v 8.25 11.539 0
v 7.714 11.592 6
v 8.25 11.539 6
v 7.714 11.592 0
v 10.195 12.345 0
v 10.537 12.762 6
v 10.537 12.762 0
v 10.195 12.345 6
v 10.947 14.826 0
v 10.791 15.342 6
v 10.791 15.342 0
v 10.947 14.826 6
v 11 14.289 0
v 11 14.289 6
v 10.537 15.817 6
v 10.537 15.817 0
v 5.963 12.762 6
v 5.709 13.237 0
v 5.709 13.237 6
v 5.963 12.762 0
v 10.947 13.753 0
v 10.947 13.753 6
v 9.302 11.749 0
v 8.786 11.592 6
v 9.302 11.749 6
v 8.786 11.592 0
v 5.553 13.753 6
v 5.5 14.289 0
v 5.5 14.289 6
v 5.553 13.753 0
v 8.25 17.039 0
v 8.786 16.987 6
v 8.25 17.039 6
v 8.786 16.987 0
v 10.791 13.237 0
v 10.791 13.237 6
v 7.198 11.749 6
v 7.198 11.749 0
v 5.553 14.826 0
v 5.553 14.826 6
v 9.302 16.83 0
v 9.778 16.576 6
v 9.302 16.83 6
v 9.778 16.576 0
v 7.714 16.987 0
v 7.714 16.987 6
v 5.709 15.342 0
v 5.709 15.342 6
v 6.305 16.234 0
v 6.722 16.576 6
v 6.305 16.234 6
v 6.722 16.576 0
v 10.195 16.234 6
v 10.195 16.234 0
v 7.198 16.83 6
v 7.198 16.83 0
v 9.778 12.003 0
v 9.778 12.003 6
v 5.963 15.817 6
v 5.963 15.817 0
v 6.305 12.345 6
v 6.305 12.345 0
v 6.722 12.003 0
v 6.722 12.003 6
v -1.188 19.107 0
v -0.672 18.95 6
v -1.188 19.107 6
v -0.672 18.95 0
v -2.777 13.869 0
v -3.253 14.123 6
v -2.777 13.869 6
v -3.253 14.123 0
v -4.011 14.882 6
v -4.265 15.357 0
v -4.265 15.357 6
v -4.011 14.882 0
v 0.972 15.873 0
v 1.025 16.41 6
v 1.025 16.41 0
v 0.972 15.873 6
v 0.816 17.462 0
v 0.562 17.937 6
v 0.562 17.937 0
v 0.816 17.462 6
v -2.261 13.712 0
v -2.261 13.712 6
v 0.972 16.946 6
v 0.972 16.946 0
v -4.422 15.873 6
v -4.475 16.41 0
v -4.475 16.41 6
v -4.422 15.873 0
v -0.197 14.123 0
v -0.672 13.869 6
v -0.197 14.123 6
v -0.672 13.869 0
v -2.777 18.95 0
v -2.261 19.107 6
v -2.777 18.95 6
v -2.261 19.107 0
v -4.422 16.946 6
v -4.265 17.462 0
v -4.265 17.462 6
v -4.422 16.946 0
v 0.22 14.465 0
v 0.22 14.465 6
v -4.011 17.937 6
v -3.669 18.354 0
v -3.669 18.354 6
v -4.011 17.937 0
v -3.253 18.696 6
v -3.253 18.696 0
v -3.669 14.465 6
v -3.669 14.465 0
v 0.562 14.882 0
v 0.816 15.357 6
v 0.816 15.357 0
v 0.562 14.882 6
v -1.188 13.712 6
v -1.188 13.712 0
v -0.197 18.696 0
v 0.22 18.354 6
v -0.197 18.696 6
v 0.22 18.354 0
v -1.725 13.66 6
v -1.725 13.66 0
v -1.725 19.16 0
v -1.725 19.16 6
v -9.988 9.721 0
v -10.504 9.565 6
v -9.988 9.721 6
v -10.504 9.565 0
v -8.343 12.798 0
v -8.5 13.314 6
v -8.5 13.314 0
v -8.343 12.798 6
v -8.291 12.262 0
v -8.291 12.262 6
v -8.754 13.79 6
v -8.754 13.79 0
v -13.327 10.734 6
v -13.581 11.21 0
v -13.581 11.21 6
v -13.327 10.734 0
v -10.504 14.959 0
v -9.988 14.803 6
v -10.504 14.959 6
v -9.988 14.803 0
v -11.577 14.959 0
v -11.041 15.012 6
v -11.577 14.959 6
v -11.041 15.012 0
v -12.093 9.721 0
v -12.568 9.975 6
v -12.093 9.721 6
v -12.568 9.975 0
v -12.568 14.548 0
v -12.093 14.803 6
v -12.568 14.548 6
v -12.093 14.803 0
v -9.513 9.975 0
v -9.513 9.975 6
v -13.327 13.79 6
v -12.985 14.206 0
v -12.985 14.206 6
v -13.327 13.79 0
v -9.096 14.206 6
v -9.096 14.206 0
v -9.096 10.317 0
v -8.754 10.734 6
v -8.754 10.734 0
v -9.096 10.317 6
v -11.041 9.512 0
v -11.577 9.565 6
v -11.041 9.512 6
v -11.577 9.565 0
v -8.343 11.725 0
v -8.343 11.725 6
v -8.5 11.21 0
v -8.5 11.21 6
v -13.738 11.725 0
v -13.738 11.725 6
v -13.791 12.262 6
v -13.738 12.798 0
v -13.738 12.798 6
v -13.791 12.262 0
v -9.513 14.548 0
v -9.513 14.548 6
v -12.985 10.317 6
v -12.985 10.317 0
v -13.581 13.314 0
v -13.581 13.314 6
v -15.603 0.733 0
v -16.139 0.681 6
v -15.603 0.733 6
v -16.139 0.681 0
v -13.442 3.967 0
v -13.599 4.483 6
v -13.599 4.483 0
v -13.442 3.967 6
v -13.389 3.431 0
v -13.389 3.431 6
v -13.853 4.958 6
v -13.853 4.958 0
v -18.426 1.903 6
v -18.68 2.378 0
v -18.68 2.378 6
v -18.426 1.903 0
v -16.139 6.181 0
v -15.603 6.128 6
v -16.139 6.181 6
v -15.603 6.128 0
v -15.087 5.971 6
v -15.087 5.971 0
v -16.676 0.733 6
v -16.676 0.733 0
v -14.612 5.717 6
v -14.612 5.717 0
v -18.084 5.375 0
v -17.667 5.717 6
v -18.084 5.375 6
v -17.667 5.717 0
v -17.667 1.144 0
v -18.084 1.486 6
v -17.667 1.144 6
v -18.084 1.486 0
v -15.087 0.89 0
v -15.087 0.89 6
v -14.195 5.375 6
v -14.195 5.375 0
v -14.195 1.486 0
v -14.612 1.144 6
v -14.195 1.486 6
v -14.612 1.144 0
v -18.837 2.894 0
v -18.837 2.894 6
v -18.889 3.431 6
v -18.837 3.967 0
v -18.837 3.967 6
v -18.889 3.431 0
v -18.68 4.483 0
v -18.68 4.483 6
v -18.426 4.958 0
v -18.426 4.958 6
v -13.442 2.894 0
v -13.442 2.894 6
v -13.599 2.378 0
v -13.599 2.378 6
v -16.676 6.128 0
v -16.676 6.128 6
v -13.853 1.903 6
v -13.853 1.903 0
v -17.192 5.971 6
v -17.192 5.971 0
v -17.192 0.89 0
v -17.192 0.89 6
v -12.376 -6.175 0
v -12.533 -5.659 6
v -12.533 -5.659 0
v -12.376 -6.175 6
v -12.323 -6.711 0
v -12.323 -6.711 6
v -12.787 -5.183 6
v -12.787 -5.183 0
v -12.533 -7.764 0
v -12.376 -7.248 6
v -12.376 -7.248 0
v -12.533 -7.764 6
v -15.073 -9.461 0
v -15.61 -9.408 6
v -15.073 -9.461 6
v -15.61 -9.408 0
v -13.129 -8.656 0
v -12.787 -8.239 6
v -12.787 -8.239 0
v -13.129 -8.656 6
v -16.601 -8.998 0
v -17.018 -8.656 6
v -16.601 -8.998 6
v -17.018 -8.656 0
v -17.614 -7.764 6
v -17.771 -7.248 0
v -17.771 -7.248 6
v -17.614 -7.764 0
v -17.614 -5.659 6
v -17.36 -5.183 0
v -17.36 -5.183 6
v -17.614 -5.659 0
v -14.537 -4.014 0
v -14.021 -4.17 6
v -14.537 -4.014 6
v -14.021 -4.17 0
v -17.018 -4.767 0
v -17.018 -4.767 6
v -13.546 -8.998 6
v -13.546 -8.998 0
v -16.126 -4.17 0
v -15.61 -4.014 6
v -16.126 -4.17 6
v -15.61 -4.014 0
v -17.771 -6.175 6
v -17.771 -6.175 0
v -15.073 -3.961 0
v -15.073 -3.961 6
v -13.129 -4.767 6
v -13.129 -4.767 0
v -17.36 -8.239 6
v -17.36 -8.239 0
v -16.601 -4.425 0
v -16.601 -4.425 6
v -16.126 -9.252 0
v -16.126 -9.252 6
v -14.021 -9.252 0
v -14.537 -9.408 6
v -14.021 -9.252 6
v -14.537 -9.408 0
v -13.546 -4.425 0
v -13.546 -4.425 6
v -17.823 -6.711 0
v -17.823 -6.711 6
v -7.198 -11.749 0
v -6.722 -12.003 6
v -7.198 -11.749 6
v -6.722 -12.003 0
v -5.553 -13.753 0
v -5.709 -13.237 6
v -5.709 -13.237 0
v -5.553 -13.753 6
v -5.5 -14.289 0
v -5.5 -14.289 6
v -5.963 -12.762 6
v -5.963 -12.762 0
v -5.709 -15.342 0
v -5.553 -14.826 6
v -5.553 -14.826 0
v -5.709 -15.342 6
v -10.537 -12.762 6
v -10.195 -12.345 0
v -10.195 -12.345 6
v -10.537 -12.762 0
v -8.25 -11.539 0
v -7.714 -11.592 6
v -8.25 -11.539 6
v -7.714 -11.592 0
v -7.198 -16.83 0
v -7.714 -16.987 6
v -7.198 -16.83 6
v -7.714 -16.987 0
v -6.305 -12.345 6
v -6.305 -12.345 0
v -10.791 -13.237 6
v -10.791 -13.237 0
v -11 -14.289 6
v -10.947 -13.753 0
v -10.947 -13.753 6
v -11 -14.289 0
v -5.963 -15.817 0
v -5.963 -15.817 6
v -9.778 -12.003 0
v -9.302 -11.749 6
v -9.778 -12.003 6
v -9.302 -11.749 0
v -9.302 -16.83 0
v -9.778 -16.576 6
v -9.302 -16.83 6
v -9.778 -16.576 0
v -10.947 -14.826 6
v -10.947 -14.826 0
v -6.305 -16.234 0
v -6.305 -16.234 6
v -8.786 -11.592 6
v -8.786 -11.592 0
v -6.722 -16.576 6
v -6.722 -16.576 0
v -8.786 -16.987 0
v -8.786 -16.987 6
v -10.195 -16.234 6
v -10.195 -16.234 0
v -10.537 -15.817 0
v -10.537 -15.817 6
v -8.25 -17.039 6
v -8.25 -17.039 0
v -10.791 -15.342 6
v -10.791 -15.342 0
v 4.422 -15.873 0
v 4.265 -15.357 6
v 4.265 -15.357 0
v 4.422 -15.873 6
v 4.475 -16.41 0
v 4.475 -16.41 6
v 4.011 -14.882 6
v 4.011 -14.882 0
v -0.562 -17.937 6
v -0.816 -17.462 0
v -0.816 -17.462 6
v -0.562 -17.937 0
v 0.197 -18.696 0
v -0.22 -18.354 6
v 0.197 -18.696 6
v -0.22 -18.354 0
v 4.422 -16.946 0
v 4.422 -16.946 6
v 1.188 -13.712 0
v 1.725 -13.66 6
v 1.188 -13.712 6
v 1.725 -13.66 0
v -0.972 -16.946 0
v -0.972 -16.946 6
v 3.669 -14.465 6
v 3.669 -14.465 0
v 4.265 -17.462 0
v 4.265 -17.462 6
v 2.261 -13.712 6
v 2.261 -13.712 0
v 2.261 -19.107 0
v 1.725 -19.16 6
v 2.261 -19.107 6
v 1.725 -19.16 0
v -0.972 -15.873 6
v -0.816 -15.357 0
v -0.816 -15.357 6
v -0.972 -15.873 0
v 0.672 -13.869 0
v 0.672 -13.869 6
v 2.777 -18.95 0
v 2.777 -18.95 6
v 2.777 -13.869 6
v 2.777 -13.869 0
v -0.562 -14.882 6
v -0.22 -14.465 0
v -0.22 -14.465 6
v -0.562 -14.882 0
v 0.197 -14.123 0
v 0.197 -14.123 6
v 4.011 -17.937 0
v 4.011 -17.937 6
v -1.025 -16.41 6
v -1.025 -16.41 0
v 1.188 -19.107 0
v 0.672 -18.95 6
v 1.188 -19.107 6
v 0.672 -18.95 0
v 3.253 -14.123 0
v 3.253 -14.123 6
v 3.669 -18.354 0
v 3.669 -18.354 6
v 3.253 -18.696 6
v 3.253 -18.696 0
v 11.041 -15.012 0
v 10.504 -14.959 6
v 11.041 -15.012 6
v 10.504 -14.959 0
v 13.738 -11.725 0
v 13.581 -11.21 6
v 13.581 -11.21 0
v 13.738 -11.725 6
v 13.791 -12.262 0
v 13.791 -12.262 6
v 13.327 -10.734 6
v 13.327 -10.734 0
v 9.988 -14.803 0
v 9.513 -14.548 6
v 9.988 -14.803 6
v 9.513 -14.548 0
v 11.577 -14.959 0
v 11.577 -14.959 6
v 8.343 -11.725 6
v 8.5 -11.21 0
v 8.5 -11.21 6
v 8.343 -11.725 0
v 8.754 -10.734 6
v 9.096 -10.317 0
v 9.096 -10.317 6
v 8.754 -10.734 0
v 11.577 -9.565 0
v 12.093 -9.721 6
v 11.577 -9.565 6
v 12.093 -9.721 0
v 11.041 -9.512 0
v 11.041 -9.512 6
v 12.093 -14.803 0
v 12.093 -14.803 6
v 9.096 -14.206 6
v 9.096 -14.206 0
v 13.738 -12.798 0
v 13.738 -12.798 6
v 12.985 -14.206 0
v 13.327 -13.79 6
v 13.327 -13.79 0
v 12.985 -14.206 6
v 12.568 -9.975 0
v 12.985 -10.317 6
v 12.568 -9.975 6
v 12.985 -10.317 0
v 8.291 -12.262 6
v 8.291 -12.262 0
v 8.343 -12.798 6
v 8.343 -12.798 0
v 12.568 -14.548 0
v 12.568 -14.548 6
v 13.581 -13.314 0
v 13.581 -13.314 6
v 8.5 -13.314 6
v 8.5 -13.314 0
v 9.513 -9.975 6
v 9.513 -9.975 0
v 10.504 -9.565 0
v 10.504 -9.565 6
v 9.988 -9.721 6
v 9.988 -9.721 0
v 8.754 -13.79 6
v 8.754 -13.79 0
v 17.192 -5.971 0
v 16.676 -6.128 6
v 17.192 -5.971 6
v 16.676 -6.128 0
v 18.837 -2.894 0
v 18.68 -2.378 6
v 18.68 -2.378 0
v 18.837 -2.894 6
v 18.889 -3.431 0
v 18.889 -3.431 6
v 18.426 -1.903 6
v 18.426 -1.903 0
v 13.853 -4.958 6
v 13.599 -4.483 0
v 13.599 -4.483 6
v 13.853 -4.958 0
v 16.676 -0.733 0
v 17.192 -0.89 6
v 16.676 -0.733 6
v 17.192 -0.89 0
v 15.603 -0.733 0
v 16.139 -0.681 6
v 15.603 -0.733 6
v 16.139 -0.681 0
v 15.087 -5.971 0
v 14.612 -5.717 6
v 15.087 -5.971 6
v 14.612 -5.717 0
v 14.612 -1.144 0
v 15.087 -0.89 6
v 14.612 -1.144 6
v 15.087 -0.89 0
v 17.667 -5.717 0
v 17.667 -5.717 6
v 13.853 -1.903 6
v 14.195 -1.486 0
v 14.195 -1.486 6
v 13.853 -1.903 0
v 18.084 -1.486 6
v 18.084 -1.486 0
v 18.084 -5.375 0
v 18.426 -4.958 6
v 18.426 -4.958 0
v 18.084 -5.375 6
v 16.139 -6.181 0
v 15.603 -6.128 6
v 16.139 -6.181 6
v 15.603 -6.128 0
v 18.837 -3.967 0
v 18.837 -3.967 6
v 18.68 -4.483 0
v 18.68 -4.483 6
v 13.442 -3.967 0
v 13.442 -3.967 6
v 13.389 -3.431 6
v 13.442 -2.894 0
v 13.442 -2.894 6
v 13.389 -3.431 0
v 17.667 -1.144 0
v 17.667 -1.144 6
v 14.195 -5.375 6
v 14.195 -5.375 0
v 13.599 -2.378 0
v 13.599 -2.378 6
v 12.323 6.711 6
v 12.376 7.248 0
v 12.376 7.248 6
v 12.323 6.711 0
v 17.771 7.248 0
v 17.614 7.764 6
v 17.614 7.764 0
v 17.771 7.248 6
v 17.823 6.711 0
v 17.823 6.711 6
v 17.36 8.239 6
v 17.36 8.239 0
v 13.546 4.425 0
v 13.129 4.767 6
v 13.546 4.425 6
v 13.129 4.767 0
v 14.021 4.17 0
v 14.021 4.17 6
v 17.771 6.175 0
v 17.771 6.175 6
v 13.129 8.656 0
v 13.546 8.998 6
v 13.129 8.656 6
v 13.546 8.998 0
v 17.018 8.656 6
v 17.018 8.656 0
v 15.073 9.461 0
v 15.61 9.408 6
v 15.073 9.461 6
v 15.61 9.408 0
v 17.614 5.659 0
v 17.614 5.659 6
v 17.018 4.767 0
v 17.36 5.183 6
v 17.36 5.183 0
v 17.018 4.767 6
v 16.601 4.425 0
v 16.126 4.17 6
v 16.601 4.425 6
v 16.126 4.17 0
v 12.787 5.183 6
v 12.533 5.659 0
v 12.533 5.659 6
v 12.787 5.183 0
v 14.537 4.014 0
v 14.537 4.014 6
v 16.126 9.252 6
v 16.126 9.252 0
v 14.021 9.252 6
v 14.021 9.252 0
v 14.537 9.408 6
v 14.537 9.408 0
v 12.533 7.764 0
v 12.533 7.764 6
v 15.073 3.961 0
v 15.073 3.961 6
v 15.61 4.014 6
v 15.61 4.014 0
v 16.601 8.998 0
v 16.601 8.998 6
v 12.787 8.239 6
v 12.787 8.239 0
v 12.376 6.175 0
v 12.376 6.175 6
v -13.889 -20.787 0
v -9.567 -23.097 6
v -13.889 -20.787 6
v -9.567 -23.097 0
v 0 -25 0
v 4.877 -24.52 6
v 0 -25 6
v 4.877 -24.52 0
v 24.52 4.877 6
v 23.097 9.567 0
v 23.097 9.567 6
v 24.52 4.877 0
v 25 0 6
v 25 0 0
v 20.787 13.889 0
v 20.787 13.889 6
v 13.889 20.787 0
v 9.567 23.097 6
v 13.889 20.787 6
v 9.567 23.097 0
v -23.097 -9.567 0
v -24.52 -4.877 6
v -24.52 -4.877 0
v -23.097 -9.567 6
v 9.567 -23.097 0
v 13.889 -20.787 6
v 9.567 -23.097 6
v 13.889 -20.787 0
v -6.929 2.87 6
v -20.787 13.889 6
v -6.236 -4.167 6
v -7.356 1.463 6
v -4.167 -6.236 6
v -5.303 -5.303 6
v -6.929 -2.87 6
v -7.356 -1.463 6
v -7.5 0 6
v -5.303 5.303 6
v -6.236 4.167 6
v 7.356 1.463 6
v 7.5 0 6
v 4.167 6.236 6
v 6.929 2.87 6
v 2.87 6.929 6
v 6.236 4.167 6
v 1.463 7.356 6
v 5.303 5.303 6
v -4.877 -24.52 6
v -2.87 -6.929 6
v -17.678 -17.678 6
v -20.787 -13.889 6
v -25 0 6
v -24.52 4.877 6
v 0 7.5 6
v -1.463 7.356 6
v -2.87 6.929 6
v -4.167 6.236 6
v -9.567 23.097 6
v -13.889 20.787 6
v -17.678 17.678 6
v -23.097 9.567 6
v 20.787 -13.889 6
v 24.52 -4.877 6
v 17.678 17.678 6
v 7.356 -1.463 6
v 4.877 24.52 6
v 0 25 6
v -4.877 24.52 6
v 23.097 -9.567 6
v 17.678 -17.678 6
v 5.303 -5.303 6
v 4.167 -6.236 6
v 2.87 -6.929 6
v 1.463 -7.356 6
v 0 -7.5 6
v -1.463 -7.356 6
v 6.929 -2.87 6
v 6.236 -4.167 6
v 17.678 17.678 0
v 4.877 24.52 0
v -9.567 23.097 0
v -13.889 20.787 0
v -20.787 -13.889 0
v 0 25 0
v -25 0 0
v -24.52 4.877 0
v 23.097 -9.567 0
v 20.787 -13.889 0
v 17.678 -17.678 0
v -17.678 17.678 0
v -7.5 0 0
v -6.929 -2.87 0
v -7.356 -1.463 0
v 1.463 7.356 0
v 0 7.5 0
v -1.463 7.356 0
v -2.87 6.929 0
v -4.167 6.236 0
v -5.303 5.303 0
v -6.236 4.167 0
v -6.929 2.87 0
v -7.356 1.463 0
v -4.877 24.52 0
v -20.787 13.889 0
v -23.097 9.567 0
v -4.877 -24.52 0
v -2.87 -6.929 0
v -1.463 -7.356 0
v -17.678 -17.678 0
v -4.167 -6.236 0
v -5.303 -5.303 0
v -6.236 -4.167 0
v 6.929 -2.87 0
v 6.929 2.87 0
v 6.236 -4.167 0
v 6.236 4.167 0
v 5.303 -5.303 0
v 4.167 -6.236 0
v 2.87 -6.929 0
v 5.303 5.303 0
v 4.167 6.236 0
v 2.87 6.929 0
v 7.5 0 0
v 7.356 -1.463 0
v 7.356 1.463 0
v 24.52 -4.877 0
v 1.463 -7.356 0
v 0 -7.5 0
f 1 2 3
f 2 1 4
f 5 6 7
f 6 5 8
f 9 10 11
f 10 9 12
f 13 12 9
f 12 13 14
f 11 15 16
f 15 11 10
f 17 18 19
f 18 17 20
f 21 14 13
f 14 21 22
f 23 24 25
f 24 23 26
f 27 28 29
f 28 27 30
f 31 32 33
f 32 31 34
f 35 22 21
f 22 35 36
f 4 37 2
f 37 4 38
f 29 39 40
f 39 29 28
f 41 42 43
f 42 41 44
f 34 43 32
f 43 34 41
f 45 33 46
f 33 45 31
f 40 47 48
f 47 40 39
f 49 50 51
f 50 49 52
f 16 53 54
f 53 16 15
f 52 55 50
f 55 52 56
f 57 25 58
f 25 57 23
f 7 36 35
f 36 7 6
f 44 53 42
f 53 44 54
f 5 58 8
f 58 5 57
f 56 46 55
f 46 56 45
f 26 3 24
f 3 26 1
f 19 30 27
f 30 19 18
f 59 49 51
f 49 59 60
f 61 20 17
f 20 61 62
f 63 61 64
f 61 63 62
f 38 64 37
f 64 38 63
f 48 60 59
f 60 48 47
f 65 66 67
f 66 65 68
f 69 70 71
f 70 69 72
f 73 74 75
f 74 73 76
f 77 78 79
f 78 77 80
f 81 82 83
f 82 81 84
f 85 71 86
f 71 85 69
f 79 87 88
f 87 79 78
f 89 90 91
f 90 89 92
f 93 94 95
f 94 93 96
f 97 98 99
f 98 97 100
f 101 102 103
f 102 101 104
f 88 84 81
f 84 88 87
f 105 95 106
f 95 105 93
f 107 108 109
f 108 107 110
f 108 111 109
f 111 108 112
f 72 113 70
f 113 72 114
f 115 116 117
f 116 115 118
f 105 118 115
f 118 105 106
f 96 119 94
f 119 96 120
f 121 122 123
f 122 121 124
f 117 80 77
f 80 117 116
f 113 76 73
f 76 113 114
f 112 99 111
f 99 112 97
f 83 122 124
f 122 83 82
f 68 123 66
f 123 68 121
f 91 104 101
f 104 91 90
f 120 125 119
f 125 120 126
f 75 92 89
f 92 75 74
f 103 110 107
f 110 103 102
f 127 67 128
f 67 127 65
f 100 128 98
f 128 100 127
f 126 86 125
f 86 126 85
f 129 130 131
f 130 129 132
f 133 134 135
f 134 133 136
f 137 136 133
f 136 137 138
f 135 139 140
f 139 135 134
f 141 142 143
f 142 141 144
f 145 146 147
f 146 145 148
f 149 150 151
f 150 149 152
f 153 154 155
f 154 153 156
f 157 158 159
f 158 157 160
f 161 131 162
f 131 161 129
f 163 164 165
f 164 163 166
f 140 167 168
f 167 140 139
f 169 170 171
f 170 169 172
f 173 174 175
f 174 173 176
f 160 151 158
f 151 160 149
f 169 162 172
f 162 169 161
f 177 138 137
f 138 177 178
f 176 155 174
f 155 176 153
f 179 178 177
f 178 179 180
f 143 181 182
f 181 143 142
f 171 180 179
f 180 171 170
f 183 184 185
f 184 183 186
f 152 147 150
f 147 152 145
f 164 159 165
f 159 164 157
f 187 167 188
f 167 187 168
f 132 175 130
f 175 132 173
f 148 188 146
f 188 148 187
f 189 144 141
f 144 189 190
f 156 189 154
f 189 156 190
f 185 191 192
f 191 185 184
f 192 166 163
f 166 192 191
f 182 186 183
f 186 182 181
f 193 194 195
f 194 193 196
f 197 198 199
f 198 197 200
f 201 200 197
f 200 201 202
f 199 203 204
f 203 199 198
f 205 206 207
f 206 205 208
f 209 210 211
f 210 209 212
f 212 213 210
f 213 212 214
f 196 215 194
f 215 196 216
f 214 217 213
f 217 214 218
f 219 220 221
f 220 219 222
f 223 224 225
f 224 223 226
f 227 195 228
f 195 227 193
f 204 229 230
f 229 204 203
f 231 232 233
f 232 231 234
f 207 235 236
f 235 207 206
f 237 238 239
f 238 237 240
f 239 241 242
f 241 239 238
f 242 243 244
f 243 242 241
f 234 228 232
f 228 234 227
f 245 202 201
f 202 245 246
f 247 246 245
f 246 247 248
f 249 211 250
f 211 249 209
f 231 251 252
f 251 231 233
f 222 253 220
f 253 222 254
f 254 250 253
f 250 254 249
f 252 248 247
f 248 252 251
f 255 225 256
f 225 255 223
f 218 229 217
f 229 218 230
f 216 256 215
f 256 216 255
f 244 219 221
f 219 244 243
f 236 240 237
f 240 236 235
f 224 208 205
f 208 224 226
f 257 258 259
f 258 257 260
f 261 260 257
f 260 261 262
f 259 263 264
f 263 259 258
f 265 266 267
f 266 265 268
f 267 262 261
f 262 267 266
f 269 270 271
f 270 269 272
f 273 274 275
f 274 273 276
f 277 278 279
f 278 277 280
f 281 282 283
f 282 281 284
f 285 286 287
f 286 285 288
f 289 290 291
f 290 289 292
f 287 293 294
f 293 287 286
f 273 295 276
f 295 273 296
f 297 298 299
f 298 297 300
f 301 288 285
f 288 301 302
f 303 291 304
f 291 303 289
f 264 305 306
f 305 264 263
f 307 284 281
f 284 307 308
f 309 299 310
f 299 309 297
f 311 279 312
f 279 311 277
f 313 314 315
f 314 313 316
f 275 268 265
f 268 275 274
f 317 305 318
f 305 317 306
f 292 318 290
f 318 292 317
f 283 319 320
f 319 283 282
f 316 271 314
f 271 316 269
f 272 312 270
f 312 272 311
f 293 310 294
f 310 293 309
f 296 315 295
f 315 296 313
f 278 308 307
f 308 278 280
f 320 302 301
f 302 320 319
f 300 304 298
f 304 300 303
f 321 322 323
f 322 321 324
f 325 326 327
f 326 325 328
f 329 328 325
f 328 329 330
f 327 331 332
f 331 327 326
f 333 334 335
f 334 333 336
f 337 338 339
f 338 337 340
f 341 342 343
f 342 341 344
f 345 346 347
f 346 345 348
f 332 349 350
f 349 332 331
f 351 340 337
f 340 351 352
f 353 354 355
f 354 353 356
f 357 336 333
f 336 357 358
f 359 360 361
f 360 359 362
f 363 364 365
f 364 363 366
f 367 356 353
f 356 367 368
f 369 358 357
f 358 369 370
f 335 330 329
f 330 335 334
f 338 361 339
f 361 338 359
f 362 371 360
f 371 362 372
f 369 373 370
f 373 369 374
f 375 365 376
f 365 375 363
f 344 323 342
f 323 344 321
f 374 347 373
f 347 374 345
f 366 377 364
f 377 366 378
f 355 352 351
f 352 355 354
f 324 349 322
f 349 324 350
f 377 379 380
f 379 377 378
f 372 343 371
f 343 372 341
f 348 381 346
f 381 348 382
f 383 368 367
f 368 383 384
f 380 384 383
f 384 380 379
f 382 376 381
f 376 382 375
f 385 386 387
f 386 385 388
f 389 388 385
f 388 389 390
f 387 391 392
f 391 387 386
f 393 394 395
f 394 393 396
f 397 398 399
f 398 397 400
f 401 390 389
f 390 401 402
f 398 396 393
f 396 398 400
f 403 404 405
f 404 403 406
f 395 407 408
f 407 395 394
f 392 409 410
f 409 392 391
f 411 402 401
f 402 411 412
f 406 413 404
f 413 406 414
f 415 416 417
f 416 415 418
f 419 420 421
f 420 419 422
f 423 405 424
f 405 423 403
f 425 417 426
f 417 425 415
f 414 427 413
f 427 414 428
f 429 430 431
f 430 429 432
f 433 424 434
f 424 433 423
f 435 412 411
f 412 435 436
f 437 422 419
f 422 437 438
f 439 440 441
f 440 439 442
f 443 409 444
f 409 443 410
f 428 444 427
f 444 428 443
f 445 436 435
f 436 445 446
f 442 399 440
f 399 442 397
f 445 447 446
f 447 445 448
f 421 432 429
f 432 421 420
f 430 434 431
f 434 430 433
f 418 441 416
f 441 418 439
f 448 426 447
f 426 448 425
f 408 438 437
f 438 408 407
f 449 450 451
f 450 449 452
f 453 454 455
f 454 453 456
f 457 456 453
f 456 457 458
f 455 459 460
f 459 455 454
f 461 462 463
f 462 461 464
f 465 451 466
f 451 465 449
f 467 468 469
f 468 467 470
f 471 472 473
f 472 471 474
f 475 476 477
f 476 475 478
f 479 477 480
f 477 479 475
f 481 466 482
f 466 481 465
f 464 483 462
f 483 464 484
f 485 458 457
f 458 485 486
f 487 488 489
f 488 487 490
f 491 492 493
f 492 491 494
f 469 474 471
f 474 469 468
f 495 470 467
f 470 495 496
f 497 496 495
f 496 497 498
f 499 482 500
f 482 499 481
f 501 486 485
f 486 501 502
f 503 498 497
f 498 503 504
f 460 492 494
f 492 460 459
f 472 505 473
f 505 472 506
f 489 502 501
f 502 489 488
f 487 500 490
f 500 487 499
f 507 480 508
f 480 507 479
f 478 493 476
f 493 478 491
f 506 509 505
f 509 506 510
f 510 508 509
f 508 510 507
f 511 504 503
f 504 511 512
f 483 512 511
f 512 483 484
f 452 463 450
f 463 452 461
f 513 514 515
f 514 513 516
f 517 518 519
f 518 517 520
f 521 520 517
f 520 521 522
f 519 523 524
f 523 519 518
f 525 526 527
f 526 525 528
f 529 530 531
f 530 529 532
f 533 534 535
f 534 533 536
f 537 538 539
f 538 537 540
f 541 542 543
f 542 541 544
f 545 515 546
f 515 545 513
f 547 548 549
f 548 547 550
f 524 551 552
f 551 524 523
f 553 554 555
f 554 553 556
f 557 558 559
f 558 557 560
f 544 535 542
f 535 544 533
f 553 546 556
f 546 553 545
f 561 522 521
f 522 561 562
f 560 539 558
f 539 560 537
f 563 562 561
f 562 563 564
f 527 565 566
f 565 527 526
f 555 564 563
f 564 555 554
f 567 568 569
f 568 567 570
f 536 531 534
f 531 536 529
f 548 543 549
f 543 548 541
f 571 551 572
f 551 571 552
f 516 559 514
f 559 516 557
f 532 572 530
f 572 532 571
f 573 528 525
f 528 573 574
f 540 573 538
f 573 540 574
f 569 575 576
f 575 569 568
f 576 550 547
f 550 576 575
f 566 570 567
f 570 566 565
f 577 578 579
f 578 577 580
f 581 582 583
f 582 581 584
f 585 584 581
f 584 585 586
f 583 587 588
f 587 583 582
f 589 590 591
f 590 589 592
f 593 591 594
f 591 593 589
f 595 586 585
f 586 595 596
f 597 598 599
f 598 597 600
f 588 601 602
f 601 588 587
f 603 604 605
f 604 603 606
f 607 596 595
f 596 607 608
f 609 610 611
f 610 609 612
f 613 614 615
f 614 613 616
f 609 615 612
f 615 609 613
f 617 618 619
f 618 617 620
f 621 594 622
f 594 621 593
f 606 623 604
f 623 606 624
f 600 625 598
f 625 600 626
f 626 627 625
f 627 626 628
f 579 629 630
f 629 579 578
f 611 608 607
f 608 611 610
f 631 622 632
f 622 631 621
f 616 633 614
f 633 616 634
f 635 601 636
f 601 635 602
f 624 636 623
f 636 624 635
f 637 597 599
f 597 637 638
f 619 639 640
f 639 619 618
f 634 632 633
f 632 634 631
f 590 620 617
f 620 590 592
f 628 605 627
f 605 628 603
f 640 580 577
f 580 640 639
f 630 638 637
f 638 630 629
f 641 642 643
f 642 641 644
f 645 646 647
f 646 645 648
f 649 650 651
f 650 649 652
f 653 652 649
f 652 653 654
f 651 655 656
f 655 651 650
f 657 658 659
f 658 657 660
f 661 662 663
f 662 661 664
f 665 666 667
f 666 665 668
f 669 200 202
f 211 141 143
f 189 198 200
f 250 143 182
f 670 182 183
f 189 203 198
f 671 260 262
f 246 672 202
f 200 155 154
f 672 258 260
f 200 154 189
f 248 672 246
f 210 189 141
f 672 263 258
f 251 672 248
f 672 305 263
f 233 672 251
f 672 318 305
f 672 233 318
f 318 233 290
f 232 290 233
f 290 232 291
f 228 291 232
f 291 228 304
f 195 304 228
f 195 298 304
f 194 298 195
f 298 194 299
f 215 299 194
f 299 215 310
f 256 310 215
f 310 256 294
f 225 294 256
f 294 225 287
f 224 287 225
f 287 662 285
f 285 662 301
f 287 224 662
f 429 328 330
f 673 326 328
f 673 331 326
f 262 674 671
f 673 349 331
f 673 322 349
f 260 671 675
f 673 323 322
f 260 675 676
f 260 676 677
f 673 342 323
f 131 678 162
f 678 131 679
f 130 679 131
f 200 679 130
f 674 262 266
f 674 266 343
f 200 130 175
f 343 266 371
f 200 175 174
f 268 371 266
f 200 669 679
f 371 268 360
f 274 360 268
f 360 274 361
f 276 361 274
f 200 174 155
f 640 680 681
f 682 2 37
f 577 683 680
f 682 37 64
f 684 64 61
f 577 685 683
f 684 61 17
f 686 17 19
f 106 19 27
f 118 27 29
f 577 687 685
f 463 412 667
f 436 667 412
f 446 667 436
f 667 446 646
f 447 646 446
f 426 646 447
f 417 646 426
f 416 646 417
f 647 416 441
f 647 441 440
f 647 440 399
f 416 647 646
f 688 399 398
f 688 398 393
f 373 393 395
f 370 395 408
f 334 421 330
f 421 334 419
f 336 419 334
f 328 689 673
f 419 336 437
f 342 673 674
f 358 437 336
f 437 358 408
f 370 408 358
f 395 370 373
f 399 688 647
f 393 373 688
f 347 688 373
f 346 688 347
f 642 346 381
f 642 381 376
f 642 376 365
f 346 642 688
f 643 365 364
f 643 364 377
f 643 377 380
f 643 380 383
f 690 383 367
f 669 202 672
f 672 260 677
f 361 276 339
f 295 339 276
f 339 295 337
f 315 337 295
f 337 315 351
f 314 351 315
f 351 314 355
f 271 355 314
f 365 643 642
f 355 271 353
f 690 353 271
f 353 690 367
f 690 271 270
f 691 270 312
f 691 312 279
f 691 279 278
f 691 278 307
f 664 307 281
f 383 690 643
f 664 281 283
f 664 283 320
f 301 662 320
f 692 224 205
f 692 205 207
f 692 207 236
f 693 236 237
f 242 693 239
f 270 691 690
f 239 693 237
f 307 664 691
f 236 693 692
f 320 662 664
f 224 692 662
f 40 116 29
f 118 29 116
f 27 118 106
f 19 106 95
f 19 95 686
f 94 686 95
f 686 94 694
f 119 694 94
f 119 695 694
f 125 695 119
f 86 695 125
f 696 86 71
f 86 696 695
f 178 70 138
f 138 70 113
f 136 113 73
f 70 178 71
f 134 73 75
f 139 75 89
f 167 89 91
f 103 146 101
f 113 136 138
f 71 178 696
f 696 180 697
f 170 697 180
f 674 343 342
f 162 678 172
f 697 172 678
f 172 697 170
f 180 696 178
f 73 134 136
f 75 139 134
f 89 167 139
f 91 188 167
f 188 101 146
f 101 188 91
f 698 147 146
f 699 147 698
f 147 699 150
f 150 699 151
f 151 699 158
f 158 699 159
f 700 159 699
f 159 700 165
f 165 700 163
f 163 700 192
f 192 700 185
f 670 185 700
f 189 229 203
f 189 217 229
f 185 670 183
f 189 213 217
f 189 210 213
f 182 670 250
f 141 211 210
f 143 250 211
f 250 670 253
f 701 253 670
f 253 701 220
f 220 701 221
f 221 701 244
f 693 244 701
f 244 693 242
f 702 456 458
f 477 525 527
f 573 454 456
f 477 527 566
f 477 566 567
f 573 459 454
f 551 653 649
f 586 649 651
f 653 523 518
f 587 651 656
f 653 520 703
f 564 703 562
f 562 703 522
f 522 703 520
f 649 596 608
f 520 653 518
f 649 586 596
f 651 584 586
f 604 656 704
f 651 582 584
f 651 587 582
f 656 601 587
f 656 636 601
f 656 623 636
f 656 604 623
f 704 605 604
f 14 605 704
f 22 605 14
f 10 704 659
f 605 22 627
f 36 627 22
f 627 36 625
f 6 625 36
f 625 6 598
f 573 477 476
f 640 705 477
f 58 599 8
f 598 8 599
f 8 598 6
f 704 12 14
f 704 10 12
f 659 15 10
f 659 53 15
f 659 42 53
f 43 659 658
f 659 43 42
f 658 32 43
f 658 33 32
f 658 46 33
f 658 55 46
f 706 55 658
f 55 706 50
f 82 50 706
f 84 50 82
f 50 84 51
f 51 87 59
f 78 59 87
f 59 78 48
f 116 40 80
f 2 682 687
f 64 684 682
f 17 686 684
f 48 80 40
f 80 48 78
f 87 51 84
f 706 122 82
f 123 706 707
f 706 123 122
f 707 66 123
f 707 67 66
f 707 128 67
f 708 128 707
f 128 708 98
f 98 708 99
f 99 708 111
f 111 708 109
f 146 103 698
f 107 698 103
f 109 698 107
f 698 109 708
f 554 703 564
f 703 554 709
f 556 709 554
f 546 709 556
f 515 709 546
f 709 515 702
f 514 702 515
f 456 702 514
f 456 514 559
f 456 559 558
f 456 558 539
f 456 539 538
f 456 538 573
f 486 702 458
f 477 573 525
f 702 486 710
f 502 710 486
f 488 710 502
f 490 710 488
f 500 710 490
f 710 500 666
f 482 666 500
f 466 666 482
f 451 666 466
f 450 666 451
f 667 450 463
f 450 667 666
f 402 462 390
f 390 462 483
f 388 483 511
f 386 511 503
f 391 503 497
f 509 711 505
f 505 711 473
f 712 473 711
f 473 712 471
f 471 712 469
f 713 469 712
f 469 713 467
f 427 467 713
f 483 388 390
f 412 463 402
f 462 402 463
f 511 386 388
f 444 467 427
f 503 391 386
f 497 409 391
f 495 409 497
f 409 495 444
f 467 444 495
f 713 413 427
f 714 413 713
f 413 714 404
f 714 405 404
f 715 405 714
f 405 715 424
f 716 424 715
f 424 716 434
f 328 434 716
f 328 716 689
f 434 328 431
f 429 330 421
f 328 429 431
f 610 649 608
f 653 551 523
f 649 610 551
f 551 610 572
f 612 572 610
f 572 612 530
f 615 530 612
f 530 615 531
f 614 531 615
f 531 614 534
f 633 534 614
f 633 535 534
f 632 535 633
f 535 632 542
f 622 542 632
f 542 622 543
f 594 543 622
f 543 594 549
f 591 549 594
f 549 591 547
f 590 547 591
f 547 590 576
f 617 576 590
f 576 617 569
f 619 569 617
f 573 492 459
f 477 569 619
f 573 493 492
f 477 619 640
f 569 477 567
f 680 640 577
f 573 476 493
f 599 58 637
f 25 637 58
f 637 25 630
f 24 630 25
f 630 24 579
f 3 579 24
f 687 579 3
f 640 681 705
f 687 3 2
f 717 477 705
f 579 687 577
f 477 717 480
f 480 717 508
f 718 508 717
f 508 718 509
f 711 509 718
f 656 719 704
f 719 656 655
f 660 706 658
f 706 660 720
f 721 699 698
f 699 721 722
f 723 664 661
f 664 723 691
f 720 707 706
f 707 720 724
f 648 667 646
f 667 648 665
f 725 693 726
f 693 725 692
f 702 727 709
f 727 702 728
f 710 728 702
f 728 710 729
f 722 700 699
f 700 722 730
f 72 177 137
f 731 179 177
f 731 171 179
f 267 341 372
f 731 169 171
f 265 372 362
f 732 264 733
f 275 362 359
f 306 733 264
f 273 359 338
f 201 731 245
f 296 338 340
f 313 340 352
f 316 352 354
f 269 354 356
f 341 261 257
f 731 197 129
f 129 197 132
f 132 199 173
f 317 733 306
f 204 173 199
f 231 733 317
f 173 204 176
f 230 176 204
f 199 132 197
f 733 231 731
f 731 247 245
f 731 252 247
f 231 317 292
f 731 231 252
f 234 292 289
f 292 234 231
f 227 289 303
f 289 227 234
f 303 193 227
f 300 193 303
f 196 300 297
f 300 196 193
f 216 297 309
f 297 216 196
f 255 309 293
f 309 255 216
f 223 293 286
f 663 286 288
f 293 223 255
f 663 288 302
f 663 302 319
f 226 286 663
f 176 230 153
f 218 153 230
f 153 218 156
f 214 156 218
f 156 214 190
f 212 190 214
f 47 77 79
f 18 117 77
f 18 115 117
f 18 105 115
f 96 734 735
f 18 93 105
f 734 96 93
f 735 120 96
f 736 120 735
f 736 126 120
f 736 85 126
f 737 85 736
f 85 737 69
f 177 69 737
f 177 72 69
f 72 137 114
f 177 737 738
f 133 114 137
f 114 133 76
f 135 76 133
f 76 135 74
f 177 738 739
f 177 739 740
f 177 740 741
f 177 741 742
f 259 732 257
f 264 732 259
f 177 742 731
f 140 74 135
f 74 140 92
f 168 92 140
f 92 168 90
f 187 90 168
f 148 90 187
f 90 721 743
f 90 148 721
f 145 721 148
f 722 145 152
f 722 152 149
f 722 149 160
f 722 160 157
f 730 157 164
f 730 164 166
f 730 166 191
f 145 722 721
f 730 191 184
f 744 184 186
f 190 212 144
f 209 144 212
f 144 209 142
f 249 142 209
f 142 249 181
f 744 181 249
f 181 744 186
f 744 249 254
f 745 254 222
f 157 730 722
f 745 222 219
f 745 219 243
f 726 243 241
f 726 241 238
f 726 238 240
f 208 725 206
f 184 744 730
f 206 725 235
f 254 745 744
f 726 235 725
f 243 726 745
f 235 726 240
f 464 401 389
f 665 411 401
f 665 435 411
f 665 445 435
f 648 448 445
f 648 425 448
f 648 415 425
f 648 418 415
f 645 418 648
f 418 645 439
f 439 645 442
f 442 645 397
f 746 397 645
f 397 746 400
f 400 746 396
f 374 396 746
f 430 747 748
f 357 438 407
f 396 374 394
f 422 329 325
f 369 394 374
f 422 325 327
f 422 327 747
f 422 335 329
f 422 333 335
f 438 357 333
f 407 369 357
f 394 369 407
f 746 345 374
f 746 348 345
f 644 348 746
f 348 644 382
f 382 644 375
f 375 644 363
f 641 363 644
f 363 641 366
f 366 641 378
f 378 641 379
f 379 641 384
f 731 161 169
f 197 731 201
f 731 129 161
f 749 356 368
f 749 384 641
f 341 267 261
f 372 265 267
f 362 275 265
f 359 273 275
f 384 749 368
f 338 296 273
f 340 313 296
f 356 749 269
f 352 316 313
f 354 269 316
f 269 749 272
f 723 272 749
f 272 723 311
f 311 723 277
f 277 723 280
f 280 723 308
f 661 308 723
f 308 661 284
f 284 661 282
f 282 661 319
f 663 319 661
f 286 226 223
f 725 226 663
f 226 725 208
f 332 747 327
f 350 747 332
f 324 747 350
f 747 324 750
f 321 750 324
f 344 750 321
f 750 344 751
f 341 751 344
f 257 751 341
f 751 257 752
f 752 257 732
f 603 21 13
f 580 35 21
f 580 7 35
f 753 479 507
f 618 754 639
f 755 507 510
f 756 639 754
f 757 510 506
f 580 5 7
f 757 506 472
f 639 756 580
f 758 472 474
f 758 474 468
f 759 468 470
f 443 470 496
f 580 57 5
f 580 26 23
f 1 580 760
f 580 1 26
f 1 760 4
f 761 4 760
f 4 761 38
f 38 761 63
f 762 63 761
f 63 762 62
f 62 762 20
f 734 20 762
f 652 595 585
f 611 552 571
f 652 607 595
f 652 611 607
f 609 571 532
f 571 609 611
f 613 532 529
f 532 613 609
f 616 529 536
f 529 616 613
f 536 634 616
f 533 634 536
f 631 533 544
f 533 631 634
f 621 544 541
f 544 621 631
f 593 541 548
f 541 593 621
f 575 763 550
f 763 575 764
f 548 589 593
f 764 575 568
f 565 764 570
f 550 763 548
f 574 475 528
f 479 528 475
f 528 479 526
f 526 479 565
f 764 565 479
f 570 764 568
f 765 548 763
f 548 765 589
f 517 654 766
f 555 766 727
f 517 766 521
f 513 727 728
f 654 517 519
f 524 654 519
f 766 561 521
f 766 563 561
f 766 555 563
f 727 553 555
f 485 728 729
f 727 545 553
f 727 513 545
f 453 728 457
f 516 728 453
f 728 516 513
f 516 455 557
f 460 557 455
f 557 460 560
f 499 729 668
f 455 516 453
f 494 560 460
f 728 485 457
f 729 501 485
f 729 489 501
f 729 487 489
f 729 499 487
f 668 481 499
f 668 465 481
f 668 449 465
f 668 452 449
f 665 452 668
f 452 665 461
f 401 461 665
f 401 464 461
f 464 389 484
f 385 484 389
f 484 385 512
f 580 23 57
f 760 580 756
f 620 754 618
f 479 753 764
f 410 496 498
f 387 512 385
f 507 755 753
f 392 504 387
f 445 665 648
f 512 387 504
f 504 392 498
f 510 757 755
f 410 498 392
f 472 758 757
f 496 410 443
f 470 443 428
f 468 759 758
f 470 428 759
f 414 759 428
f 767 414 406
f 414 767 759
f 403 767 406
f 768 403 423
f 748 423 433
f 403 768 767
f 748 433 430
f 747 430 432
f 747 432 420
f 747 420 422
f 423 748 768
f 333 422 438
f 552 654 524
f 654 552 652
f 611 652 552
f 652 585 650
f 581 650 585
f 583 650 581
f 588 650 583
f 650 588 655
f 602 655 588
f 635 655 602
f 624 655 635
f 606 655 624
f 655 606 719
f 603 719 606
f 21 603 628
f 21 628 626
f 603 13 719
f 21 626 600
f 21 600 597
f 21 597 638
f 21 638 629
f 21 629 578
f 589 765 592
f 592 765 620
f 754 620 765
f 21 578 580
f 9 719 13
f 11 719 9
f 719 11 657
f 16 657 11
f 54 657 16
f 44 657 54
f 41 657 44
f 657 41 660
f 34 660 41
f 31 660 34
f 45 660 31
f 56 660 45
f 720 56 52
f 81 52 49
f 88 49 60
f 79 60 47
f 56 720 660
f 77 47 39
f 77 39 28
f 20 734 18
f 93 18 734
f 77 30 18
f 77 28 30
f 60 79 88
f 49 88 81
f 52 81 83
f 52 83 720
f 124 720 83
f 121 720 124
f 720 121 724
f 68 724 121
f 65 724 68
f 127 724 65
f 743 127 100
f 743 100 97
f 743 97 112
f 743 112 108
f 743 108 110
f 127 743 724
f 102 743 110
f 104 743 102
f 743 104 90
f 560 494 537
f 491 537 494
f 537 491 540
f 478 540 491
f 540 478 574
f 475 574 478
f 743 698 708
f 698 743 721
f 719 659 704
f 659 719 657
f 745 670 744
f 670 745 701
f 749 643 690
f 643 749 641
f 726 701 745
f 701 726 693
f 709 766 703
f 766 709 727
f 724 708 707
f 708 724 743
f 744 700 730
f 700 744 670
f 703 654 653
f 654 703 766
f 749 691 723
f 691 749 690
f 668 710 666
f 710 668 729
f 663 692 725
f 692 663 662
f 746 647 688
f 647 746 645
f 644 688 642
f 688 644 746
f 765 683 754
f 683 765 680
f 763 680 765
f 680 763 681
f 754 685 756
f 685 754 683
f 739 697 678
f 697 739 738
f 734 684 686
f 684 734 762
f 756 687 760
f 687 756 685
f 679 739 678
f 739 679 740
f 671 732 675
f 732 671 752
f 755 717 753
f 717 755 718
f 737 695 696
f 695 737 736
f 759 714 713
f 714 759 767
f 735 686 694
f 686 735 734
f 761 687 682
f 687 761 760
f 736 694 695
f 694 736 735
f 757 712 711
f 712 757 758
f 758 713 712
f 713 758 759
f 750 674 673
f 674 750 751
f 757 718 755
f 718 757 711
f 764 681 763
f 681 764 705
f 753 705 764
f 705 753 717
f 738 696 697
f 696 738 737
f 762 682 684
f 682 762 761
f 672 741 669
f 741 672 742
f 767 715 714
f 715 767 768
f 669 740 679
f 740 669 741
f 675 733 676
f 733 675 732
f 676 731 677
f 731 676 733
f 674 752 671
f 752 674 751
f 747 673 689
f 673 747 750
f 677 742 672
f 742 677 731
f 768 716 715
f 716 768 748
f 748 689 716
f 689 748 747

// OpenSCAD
$fn = 32;

// ----------------------------------------------------------------------
// Flange Ø50 x 6
// 10 holes on a Ø33 bolt circle, bolted joints
// ----------------------------------------------------------------------

// --- parameters (mm) ---
flange_d = 50;   // outside diameter of the flange
thickness = 6;   // flange thickness
holes = 10;      // number of bolt holes
pcd = 33;        // bolt circle diameter
start_deg = 60;  // angle of the first hole, from +X
hole_d = 5.5;    // bolt hole diameter
bore_d = 15;     // central through bore
hub_d = 23;      // hub outside diameter
hub_h = 0;       // hub height above the flange face (0 = no hub)

// --- derived feature positions (mm) ---
height = thickness + hub_h;  // = 6   overall height of the part
pcd_r = pcd / 2;             // = 16.5   bolt circle radius
hole_step = 360 / holes;     // = 36   angular pitch
feature_centers = [
  [pcd_r * cos(start_deg + 0 * hole_step), pcd_r * sin(start_deg + 0 * hole_step)],
  [pcd_r * cos(start_deg + 1 * hole_step), pcd_r * sin(start_deg + 1 * hole_step)],
  [pcd_r * cos(start_deg + 2 * hole_step), pcd_r * sin(start_deg + 2 * hole_step)],
  [pcd_r * cos(start_deg + 3 * hole_step), pcd_r * sin(start_deg + 3 * hole_step)],
  [pcd_r * cos(start_deg + 4 * hole_step), pcd_r * sin(start_deg + 4 * hole_step)],
  [pcd_r * cos(start_deg + 5 * hole_step), pcd_r * sin(start_deg + 5 * hole_step)],
  [pcd_r * cos(start_deg + 6 * hole_step), pcd_r * sin(start_deg + 6 * hole_step)],
  [pcd_r * cos(start_deg + 7 * hole_step), pcd_r * sin(start_deg + 7 * hole_step)],
  [pcd_r * cos(start_deg + 8 * hole_step), pcd_r * sin(start_deg + 8 * hole_step)],
  [pcd_r * cos(start_deg + 9 * hole_step), pcd_r * sin(start_deg + 9 * hole_step)]
];   // bolt hole centres on the pitch circle

// flange disc, every hole and the bore cut straight through
difference() {
  union() {
    cylinder(d = flange_d, h = thickness);
  }
  translate([0, 0, -1]) cylinder(d = bore_d, h = height + 2);  // bore, through
  for (centre = feature_centers)
    translate([centre[0], centre[1], -1]) cylinder(d = hole_d, h = thickness + 2);
}
